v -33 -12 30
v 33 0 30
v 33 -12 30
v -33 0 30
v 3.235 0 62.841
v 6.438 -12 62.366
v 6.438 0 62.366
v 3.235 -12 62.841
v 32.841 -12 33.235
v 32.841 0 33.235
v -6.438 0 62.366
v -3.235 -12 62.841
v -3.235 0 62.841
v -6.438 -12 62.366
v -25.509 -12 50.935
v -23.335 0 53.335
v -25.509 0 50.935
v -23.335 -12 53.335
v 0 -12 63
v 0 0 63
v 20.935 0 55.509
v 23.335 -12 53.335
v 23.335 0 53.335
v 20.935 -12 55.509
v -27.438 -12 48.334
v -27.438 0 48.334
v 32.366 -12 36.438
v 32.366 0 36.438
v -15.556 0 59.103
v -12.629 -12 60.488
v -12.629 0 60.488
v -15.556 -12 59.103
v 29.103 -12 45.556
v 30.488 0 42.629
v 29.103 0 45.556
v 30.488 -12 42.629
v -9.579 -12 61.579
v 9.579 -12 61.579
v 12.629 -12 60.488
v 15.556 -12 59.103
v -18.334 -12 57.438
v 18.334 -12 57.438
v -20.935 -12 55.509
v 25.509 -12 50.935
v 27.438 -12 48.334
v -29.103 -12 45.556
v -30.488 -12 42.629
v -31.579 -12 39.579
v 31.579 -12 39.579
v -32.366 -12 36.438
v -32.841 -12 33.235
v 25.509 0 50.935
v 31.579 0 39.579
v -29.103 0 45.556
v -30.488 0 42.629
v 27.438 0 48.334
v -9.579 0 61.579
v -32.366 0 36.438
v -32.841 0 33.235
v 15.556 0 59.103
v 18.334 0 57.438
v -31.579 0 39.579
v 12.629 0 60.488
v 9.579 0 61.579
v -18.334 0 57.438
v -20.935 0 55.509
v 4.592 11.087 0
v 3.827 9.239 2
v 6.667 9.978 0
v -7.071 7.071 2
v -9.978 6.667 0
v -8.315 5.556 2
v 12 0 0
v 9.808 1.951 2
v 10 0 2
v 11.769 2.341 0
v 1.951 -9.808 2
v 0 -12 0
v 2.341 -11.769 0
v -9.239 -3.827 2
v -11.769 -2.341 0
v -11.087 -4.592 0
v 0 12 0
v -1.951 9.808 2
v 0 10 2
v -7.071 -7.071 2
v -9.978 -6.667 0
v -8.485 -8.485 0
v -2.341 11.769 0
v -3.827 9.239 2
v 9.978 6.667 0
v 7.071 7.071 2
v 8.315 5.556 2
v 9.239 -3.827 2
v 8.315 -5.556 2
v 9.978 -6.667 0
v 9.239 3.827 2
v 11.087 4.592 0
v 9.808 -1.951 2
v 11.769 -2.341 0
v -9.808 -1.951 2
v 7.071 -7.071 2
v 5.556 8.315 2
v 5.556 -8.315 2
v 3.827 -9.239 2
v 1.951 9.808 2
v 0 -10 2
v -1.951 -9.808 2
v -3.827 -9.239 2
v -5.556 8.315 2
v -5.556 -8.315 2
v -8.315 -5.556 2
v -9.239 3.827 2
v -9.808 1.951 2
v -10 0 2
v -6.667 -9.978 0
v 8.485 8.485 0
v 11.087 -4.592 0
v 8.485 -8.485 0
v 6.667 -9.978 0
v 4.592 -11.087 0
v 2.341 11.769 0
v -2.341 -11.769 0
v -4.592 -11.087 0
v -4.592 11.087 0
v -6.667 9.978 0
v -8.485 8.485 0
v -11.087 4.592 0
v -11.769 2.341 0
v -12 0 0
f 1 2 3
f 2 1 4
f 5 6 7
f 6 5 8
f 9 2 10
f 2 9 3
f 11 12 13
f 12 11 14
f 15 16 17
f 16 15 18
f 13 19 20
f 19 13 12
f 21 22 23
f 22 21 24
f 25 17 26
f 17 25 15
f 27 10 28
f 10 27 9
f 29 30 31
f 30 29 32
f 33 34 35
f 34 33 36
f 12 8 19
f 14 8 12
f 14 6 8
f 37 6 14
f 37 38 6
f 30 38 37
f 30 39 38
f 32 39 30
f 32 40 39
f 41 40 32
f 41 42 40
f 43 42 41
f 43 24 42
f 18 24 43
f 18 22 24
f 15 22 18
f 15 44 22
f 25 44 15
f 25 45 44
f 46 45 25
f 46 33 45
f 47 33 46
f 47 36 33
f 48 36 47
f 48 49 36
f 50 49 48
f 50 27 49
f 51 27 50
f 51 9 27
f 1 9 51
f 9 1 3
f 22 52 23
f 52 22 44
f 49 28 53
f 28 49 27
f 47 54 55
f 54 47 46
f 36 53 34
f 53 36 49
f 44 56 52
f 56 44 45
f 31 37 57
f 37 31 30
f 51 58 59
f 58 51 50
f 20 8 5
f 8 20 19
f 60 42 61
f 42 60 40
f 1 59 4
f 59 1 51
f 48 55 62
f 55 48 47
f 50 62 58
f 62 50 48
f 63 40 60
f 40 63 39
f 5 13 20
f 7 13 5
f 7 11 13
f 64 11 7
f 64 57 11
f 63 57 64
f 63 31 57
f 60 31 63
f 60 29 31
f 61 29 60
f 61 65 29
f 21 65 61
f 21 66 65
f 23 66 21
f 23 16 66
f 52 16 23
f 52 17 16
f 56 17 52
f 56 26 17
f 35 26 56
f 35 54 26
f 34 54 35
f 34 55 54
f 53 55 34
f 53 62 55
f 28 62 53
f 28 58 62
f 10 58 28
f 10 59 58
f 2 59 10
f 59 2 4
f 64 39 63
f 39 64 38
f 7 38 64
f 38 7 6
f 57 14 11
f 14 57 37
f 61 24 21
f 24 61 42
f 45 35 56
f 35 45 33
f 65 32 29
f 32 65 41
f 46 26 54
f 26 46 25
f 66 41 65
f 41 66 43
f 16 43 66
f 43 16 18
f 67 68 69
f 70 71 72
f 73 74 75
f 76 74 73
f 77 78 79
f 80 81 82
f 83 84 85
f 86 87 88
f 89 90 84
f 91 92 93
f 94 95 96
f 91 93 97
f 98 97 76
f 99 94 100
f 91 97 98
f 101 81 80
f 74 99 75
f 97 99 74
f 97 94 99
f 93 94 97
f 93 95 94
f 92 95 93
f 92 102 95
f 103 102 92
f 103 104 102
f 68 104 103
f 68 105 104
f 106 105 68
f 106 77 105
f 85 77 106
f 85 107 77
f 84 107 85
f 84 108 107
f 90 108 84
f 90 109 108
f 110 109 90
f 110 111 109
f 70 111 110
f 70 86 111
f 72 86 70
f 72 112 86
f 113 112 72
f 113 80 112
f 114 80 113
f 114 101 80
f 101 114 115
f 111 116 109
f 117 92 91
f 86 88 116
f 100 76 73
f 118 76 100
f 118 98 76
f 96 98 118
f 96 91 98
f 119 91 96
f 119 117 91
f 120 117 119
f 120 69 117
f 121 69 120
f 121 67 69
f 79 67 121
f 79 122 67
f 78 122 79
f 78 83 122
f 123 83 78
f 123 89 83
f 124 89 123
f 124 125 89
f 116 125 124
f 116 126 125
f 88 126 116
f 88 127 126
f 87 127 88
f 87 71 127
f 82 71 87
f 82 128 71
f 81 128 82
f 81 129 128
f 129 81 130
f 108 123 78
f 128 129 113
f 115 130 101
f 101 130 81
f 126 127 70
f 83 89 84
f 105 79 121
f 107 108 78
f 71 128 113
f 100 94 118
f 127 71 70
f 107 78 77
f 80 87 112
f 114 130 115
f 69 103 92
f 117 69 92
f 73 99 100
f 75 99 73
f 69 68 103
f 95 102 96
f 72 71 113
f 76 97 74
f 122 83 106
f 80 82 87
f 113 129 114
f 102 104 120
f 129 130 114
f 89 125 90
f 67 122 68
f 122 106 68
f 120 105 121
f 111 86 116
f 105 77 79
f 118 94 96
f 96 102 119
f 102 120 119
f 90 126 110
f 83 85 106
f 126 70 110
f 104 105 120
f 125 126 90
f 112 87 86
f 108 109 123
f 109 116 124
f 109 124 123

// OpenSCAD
// Watermelon Wedge - Pineapple Party model definition
// Parameters are parsed by the JS viewer; modules render in OpenSCAD

/* [Model] */
name = "watermelon";
body_type = "extrude";

/* [Body] */
body_height = 50;
body_radius = 30;
body_color = "0xff3355";
body_roughness = 0.4;
body_metalness = 0.0;

/* [Extrude] */
slice_depth = 12;
has_rind = true;
rind_thickness = 3;

/* [Bumps] */
bump_type = "seed";
bump_placement = "random";
bump_size = 1.2;
bump_rows = 5;
bumps_per_row = 4;
bump_count = 20;
bump_random_seed = 42;
bump_color = "0x222222";
bump_roughness = 0.3;
bump_metalness = 0.2;
bump_scale = [0.7, 1.2, 0.4];
bump_stagger = false;

/* [Crown] */
crown_y = 60;  // BR * 2
leaf_width = 1;
leaf_thickness = 1;
leaf_length = 1;
leaf_color = "0x2d8a2d";
leaf_roughness = 0.5;
leaf_metalness = 0.0;
leaf_placement = "crown";
leaf_rings = [];

/* [Base] */
base_r1 = 10;
base_r2 = 12;

/* [Stem] */
has_stem = false;

/* [Resolution] */
$fn = 64;

// =====================================================
// OpenSCAD rendering
// =====================================================
module watermelon_body() {
    // Half-disc watermelon slice
    linear_extrude(height = slice_depth)
    difference() {
        // Full semicircle with rind
        circle(r = body_radius + rind_thickness, $fn = 64);
        // Cut bottom half
        translate([-body_radius - rind_thickness - 1, -body_radius - rind_thickness - 1, 0])
        square([(body_radius + rind_thickness) * 2 + 2, body_radius + rind_thickness + 1]);
    }
}

module watermelon_flesh() {
    linear_extrude(height = slice_depth)
    intersection() {
        circle(r = body_radius, $fn = 64);
        translate([-(body_radius + 1), 0, 0])
        square([(body_radius + 1) * 2, body_radius + 1]);
    }
}

module seed(x, y) {
    translate([x, y, -0.5])
    scale([0.7, 1.2, 0.4])
    sphere(r = bump_size, $fn = 8);
}

module watermelon() {
    // Rind (green)
    color([0.18, 0.54, 0.18])
    translate([0, 0, body_radius])
    rotate([90, 0, 0])
    watermelon_body();

    // Flesh (red)
    color([1, 0.2, 0.33])
    translate([0, 0, body_radius])
    rotate([90, 0, 0])
    watermelon_flesh();

    // Base
    color([0.18, 0.54, 0.18])
    cylinder(h = 2, r1 = base_r2, r2 = base_r1, $fn = 32);
}

watermelon();
